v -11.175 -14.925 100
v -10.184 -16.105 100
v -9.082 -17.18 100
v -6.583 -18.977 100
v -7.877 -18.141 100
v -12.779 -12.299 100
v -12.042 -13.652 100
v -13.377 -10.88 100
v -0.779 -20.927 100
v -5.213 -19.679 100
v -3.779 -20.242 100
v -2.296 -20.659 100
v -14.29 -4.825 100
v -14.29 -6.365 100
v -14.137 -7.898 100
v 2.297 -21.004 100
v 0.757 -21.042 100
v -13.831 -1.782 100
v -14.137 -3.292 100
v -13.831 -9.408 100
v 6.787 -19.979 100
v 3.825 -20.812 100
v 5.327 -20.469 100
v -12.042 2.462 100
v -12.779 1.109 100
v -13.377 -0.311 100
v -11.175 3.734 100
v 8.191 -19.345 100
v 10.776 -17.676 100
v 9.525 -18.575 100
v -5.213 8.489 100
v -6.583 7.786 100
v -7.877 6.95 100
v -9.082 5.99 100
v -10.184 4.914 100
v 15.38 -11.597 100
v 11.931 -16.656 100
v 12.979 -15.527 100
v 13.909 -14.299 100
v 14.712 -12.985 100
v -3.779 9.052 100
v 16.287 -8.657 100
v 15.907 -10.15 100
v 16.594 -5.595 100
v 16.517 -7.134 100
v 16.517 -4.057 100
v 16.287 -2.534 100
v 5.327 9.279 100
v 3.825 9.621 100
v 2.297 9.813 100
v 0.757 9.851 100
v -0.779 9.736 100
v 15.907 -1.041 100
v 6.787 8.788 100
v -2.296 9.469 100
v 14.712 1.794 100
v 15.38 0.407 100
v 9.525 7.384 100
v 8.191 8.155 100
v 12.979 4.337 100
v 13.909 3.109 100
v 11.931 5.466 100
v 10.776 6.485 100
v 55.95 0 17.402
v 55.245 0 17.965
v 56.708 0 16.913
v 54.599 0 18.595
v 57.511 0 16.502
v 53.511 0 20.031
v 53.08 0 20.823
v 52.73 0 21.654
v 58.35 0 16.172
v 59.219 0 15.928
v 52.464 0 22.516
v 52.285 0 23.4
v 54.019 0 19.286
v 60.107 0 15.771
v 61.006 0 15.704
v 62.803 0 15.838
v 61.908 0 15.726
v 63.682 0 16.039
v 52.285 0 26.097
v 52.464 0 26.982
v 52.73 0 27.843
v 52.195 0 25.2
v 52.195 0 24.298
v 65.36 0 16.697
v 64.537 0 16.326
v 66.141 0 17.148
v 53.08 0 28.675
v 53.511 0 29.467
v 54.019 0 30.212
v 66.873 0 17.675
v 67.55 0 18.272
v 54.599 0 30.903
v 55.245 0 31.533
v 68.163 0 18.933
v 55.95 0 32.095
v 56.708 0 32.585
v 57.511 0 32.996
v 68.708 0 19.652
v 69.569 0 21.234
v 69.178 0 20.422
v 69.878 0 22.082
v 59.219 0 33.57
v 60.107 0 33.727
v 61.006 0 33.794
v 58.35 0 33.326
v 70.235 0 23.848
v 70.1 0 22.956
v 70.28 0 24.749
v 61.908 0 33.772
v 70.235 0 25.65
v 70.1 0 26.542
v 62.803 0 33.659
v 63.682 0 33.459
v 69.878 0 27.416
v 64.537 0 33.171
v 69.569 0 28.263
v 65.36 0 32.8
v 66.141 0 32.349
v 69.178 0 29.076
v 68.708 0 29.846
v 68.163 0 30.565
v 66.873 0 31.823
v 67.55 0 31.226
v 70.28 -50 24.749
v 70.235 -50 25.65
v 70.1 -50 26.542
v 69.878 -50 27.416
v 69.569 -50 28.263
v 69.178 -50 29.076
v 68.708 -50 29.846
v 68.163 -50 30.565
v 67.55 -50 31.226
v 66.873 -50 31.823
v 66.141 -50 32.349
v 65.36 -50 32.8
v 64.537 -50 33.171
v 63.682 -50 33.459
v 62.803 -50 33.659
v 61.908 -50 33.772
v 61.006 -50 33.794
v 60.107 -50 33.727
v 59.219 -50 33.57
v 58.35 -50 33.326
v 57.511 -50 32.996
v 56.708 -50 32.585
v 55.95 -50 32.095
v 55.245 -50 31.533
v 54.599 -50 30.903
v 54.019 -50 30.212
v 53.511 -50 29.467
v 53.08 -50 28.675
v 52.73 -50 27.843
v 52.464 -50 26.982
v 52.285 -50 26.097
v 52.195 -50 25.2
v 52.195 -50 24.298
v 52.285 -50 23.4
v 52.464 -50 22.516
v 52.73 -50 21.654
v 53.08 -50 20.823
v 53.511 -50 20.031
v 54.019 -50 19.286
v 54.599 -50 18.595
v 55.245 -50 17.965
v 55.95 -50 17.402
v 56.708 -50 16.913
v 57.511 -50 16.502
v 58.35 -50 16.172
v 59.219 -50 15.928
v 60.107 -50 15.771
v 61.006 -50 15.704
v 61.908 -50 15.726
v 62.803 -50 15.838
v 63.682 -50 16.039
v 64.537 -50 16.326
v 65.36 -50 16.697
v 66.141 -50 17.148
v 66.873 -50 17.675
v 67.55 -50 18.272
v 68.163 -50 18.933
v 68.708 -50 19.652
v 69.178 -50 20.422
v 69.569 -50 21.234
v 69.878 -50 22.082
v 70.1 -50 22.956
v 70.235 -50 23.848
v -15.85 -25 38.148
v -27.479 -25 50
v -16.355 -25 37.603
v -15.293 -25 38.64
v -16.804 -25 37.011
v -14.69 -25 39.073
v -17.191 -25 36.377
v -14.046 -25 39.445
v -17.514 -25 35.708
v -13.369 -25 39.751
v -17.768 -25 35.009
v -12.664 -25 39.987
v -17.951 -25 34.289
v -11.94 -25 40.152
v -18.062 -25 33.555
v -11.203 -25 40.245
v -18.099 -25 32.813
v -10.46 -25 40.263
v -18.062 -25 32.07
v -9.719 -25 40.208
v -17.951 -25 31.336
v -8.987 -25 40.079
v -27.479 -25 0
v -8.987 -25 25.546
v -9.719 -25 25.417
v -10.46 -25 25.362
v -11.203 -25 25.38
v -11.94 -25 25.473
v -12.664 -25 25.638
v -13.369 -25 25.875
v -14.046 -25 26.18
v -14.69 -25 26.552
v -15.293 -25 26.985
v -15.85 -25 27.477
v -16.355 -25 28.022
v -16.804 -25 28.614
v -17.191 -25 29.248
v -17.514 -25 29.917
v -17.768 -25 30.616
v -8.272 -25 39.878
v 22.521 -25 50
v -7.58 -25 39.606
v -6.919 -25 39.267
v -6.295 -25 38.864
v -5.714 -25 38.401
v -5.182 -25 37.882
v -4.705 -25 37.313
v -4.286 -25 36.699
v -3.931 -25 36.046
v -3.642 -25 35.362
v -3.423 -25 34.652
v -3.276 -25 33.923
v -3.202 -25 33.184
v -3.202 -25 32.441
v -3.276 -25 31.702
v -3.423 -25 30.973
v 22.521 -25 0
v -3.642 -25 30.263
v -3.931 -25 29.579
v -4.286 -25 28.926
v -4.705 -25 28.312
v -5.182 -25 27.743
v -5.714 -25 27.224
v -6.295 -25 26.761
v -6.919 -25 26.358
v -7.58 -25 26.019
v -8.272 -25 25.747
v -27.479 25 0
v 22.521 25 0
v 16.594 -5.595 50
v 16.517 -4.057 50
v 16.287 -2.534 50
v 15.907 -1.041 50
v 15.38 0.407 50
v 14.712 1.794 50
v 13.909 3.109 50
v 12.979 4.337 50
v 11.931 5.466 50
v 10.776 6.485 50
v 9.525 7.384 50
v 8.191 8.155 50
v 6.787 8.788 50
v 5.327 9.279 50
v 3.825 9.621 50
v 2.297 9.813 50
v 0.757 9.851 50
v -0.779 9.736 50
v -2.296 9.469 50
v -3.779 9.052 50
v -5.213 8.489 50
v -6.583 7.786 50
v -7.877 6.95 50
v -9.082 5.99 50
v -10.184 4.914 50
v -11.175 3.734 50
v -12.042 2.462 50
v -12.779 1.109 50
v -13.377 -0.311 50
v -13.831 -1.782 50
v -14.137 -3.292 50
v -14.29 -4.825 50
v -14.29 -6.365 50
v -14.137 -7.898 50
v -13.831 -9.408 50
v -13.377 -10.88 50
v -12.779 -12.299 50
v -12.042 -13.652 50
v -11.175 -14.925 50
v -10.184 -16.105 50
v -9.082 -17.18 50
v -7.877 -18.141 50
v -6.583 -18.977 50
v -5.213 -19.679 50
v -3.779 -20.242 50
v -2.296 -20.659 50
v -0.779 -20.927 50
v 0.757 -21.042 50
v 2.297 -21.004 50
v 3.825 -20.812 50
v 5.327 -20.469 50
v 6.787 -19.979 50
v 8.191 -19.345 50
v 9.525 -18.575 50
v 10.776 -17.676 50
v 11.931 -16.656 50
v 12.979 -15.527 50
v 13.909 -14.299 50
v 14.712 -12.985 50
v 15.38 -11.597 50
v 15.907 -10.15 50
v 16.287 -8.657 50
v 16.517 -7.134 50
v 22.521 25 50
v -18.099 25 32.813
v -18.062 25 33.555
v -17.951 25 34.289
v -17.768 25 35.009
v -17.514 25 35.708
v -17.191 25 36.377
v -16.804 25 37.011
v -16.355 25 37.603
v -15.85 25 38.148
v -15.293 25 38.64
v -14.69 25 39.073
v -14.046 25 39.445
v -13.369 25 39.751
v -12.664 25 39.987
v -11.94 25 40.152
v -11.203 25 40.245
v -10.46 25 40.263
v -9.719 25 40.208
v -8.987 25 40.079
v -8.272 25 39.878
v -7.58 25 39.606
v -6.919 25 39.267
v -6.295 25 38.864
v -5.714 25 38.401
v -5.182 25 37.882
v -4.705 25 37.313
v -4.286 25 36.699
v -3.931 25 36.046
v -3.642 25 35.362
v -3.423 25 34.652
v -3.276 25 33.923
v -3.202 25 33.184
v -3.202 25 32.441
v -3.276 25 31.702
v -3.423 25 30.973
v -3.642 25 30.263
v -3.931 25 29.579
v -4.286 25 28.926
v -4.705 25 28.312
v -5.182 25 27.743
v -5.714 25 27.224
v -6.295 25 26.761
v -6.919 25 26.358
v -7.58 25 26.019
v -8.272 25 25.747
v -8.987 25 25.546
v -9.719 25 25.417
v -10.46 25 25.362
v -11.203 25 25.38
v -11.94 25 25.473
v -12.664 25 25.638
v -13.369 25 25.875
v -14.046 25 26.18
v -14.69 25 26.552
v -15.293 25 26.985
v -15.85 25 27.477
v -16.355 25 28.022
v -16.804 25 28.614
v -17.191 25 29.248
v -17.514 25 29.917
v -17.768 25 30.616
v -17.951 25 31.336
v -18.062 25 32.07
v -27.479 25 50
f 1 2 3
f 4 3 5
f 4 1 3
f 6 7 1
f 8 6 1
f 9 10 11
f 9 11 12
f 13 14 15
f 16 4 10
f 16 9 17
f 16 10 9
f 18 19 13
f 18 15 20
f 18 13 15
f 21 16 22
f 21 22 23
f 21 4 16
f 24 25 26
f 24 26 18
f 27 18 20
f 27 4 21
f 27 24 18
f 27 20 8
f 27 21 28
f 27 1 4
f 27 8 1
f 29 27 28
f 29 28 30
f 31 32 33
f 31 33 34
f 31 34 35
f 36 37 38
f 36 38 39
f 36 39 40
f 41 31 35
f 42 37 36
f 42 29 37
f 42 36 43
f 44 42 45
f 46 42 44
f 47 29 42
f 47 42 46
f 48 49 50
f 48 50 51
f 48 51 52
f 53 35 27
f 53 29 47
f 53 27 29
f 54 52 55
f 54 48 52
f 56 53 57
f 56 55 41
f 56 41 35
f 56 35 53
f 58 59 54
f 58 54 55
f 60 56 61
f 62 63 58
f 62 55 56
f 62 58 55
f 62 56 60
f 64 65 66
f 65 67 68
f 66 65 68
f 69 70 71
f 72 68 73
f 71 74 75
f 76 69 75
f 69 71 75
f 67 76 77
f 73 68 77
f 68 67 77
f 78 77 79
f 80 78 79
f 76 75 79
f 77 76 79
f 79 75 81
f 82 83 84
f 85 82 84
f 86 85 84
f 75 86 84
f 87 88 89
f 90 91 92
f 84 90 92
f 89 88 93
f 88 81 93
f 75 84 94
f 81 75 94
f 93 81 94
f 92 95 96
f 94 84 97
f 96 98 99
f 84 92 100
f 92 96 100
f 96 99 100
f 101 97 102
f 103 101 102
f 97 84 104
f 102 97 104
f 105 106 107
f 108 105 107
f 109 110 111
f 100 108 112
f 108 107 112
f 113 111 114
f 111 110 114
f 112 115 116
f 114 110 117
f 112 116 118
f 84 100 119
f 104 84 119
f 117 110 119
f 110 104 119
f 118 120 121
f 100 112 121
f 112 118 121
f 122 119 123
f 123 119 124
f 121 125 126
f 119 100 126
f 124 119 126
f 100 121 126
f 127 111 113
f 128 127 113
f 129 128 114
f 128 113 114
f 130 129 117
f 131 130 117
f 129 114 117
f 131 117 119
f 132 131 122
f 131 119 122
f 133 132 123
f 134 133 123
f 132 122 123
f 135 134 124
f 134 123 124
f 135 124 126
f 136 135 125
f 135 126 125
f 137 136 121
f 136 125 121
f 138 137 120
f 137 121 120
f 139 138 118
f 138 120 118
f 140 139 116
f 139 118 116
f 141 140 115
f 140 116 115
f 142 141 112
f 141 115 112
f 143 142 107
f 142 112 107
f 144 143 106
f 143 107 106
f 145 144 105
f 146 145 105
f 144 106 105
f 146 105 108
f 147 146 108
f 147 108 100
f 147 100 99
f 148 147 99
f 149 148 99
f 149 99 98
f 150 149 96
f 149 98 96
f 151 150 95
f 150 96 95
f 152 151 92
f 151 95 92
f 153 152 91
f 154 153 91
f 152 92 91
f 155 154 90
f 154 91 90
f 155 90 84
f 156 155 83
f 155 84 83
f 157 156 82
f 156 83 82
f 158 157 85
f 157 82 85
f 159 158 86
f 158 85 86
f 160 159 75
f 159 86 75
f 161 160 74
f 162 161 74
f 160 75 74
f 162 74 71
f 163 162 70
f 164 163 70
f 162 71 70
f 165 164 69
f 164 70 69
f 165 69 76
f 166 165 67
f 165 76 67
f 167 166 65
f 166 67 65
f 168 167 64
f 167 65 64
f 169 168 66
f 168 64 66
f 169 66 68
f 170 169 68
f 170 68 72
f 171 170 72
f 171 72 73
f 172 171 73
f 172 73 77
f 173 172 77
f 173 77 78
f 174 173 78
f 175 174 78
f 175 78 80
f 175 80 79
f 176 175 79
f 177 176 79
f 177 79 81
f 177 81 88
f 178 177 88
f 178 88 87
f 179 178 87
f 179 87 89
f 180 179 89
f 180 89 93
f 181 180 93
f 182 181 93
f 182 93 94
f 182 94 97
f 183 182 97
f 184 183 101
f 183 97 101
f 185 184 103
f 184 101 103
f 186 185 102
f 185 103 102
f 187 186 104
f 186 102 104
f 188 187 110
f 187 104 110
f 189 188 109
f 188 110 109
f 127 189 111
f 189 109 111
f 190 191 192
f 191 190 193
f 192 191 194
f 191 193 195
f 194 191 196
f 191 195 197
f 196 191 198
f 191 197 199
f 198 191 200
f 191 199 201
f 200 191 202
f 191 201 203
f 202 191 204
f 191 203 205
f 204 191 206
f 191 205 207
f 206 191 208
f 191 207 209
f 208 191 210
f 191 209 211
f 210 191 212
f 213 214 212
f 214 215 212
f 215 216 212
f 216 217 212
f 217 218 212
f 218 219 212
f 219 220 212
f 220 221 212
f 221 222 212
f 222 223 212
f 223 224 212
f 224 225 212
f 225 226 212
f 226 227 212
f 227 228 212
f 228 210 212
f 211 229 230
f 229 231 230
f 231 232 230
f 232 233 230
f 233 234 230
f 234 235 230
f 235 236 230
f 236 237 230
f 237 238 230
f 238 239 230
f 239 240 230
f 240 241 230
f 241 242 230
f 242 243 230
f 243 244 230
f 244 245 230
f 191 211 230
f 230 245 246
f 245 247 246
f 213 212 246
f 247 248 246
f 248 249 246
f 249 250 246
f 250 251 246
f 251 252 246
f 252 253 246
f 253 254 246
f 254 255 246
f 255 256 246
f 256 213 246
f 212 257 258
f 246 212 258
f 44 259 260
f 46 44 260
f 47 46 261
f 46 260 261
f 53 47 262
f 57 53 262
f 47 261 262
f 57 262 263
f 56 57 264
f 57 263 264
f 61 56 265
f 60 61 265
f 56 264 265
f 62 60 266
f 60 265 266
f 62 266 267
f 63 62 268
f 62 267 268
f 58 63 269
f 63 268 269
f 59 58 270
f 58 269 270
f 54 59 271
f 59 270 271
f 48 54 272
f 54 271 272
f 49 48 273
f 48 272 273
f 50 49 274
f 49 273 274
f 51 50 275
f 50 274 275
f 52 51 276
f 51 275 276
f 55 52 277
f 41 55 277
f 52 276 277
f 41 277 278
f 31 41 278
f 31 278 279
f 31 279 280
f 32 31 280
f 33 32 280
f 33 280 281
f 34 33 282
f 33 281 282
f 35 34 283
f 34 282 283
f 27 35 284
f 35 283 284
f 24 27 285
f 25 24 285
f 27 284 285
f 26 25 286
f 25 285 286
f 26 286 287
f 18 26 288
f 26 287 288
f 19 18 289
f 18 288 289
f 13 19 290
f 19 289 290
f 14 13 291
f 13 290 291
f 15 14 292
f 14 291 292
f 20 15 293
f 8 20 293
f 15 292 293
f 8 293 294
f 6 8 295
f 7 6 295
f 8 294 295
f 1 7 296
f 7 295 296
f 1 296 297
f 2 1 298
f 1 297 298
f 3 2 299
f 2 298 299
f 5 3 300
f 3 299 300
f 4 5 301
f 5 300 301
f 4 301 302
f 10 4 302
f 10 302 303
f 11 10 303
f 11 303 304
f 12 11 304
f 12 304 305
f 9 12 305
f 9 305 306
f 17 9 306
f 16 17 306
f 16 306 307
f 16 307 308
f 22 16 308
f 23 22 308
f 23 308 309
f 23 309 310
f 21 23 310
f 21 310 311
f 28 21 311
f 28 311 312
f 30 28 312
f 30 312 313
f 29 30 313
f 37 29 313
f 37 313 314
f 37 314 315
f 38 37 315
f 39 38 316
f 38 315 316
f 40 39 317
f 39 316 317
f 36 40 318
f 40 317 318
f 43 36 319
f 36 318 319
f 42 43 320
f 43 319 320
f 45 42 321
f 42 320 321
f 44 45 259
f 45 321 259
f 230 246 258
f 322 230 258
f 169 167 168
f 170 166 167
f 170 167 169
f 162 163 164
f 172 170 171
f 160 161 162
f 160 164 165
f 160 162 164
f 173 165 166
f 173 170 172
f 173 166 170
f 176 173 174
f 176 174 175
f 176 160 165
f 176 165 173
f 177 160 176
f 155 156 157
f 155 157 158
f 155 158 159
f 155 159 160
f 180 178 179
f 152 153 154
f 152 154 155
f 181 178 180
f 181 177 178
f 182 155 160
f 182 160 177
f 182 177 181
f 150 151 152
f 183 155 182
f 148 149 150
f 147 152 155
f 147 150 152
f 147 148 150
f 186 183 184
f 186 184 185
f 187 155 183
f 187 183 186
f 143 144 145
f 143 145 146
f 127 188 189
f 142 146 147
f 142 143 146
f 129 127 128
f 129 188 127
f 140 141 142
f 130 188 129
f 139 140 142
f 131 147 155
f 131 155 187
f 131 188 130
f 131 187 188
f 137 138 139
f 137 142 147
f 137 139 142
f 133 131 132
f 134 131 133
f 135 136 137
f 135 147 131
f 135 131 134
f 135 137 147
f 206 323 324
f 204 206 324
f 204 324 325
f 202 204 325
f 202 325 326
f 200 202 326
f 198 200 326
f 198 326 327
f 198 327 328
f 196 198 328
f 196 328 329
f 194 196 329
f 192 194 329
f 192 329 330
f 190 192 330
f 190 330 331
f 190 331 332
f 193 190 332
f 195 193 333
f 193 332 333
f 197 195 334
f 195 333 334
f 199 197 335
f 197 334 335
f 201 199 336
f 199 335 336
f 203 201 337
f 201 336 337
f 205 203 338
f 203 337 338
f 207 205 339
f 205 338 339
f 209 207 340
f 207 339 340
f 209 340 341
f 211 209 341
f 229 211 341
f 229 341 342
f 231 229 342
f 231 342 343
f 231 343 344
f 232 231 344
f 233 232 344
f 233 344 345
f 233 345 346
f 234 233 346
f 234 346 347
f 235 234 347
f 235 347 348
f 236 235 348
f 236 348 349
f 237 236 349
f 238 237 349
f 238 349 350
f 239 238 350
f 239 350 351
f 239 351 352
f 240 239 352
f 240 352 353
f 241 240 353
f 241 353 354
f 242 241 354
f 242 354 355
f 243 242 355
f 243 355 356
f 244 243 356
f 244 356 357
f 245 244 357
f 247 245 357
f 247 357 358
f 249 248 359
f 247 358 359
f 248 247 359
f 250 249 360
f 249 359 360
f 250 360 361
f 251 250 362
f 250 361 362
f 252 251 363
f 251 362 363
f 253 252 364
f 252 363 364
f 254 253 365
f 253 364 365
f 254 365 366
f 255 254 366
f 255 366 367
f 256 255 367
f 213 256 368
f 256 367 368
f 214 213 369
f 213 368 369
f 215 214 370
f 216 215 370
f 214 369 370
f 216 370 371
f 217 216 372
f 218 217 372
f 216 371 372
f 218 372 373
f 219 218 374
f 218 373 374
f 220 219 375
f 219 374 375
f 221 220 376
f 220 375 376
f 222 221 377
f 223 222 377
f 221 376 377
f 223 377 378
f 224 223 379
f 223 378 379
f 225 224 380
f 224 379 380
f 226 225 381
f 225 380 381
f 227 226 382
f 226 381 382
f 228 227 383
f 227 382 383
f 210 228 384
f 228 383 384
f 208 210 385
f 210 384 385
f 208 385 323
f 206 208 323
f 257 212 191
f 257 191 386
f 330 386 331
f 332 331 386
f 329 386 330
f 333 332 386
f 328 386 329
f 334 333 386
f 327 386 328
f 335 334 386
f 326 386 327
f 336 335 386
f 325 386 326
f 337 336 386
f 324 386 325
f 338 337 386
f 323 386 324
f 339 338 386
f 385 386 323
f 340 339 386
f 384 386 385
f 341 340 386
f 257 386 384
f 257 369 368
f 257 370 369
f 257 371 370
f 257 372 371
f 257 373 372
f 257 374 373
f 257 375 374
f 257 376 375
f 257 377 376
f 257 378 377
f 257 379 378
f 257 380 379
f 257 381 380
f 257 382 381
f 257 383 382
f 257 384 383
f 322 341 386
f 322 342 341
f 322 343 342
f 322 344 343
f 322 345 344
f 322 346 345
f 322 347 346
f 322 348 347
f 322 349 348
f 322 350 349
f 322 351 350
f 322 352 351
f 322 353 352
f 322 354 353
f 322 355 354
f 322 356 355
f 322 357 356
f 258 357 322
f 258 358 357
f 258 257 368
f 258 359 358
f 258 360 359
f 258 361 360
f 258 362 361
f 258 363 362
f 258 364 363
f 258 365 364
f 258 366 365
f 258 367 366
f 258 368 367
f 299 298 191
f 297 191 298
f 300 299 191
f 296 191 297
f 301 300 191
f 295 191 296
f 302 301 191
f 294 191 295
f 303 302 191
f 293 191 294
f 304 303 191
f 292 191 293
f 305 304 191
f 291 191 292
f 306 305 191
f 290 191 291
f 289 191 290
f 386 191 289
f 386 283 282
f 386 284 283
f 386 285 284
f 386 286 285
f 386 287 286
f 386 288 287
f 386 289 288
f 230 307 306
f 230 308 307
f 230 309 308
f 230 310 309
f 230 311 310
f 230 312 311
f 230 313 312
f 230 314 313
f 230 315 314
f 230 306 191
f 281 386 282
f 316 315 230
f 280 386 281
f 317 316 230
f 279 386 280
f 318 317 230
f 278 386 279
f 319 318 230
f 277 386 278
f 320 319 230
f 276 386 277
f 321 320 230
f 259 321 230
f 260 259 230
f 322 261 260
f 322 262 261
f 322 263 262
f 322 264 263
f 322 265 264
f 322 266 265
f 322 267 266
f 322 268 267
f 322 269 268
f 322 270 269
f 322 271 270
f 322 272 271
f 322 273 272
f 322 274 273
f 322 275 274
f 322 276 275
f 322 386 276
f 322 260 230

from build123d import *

# Parameters (mm, degrees)
F0_W     = 50
F0_H     = 50
F1_DEPTH = 50
F2_R     = 9.047983
F3_DEPTH = 50
F5_R     = 7.453212
F6_DEPTH = 60
F4_R     = 15.451466
F7_DEPTH = 50


with BuildPart() as f1:
    # F0 (on Top) → F1 (new body)
    with BuildSketch(Plane.XY):
        with Locations((-2.479169, 0)):
            Rectangle(F0_W, F0_H)
    extrude(amount=F1_DEPTH)

    # F5 (on face) → F6 (cut)
    with BuildSketch(Plane(origin=(0, 25, 0), x_dir=(-1, 0, 0), z_dir=(0, 1, 0))):
        with Locations((10.645833, 32.812502)):
            Circle(F5_R)
    extrude(amount=-F6_DEPTH, mode=Mode.SUBTRACT)

    # F4 (on face) → F7 (join)
    with BuildSketch(Plane.XY.offset(50)):
        with Locations((1.142243, -5.595263)):
            Circle(F4_R)
    extrude(amount=F7_DEPTH)


with BuildPart() as f3:
    # F2 (on Front) → F3 (new body)
    with BuildSketch(Plane.XZ):
        with Locations((61.2319, 24.748858)):
            Circle(F2_R)
    extrude(amount=F3_DEPTH)


solid = Compound([f1.part, f3.part])
